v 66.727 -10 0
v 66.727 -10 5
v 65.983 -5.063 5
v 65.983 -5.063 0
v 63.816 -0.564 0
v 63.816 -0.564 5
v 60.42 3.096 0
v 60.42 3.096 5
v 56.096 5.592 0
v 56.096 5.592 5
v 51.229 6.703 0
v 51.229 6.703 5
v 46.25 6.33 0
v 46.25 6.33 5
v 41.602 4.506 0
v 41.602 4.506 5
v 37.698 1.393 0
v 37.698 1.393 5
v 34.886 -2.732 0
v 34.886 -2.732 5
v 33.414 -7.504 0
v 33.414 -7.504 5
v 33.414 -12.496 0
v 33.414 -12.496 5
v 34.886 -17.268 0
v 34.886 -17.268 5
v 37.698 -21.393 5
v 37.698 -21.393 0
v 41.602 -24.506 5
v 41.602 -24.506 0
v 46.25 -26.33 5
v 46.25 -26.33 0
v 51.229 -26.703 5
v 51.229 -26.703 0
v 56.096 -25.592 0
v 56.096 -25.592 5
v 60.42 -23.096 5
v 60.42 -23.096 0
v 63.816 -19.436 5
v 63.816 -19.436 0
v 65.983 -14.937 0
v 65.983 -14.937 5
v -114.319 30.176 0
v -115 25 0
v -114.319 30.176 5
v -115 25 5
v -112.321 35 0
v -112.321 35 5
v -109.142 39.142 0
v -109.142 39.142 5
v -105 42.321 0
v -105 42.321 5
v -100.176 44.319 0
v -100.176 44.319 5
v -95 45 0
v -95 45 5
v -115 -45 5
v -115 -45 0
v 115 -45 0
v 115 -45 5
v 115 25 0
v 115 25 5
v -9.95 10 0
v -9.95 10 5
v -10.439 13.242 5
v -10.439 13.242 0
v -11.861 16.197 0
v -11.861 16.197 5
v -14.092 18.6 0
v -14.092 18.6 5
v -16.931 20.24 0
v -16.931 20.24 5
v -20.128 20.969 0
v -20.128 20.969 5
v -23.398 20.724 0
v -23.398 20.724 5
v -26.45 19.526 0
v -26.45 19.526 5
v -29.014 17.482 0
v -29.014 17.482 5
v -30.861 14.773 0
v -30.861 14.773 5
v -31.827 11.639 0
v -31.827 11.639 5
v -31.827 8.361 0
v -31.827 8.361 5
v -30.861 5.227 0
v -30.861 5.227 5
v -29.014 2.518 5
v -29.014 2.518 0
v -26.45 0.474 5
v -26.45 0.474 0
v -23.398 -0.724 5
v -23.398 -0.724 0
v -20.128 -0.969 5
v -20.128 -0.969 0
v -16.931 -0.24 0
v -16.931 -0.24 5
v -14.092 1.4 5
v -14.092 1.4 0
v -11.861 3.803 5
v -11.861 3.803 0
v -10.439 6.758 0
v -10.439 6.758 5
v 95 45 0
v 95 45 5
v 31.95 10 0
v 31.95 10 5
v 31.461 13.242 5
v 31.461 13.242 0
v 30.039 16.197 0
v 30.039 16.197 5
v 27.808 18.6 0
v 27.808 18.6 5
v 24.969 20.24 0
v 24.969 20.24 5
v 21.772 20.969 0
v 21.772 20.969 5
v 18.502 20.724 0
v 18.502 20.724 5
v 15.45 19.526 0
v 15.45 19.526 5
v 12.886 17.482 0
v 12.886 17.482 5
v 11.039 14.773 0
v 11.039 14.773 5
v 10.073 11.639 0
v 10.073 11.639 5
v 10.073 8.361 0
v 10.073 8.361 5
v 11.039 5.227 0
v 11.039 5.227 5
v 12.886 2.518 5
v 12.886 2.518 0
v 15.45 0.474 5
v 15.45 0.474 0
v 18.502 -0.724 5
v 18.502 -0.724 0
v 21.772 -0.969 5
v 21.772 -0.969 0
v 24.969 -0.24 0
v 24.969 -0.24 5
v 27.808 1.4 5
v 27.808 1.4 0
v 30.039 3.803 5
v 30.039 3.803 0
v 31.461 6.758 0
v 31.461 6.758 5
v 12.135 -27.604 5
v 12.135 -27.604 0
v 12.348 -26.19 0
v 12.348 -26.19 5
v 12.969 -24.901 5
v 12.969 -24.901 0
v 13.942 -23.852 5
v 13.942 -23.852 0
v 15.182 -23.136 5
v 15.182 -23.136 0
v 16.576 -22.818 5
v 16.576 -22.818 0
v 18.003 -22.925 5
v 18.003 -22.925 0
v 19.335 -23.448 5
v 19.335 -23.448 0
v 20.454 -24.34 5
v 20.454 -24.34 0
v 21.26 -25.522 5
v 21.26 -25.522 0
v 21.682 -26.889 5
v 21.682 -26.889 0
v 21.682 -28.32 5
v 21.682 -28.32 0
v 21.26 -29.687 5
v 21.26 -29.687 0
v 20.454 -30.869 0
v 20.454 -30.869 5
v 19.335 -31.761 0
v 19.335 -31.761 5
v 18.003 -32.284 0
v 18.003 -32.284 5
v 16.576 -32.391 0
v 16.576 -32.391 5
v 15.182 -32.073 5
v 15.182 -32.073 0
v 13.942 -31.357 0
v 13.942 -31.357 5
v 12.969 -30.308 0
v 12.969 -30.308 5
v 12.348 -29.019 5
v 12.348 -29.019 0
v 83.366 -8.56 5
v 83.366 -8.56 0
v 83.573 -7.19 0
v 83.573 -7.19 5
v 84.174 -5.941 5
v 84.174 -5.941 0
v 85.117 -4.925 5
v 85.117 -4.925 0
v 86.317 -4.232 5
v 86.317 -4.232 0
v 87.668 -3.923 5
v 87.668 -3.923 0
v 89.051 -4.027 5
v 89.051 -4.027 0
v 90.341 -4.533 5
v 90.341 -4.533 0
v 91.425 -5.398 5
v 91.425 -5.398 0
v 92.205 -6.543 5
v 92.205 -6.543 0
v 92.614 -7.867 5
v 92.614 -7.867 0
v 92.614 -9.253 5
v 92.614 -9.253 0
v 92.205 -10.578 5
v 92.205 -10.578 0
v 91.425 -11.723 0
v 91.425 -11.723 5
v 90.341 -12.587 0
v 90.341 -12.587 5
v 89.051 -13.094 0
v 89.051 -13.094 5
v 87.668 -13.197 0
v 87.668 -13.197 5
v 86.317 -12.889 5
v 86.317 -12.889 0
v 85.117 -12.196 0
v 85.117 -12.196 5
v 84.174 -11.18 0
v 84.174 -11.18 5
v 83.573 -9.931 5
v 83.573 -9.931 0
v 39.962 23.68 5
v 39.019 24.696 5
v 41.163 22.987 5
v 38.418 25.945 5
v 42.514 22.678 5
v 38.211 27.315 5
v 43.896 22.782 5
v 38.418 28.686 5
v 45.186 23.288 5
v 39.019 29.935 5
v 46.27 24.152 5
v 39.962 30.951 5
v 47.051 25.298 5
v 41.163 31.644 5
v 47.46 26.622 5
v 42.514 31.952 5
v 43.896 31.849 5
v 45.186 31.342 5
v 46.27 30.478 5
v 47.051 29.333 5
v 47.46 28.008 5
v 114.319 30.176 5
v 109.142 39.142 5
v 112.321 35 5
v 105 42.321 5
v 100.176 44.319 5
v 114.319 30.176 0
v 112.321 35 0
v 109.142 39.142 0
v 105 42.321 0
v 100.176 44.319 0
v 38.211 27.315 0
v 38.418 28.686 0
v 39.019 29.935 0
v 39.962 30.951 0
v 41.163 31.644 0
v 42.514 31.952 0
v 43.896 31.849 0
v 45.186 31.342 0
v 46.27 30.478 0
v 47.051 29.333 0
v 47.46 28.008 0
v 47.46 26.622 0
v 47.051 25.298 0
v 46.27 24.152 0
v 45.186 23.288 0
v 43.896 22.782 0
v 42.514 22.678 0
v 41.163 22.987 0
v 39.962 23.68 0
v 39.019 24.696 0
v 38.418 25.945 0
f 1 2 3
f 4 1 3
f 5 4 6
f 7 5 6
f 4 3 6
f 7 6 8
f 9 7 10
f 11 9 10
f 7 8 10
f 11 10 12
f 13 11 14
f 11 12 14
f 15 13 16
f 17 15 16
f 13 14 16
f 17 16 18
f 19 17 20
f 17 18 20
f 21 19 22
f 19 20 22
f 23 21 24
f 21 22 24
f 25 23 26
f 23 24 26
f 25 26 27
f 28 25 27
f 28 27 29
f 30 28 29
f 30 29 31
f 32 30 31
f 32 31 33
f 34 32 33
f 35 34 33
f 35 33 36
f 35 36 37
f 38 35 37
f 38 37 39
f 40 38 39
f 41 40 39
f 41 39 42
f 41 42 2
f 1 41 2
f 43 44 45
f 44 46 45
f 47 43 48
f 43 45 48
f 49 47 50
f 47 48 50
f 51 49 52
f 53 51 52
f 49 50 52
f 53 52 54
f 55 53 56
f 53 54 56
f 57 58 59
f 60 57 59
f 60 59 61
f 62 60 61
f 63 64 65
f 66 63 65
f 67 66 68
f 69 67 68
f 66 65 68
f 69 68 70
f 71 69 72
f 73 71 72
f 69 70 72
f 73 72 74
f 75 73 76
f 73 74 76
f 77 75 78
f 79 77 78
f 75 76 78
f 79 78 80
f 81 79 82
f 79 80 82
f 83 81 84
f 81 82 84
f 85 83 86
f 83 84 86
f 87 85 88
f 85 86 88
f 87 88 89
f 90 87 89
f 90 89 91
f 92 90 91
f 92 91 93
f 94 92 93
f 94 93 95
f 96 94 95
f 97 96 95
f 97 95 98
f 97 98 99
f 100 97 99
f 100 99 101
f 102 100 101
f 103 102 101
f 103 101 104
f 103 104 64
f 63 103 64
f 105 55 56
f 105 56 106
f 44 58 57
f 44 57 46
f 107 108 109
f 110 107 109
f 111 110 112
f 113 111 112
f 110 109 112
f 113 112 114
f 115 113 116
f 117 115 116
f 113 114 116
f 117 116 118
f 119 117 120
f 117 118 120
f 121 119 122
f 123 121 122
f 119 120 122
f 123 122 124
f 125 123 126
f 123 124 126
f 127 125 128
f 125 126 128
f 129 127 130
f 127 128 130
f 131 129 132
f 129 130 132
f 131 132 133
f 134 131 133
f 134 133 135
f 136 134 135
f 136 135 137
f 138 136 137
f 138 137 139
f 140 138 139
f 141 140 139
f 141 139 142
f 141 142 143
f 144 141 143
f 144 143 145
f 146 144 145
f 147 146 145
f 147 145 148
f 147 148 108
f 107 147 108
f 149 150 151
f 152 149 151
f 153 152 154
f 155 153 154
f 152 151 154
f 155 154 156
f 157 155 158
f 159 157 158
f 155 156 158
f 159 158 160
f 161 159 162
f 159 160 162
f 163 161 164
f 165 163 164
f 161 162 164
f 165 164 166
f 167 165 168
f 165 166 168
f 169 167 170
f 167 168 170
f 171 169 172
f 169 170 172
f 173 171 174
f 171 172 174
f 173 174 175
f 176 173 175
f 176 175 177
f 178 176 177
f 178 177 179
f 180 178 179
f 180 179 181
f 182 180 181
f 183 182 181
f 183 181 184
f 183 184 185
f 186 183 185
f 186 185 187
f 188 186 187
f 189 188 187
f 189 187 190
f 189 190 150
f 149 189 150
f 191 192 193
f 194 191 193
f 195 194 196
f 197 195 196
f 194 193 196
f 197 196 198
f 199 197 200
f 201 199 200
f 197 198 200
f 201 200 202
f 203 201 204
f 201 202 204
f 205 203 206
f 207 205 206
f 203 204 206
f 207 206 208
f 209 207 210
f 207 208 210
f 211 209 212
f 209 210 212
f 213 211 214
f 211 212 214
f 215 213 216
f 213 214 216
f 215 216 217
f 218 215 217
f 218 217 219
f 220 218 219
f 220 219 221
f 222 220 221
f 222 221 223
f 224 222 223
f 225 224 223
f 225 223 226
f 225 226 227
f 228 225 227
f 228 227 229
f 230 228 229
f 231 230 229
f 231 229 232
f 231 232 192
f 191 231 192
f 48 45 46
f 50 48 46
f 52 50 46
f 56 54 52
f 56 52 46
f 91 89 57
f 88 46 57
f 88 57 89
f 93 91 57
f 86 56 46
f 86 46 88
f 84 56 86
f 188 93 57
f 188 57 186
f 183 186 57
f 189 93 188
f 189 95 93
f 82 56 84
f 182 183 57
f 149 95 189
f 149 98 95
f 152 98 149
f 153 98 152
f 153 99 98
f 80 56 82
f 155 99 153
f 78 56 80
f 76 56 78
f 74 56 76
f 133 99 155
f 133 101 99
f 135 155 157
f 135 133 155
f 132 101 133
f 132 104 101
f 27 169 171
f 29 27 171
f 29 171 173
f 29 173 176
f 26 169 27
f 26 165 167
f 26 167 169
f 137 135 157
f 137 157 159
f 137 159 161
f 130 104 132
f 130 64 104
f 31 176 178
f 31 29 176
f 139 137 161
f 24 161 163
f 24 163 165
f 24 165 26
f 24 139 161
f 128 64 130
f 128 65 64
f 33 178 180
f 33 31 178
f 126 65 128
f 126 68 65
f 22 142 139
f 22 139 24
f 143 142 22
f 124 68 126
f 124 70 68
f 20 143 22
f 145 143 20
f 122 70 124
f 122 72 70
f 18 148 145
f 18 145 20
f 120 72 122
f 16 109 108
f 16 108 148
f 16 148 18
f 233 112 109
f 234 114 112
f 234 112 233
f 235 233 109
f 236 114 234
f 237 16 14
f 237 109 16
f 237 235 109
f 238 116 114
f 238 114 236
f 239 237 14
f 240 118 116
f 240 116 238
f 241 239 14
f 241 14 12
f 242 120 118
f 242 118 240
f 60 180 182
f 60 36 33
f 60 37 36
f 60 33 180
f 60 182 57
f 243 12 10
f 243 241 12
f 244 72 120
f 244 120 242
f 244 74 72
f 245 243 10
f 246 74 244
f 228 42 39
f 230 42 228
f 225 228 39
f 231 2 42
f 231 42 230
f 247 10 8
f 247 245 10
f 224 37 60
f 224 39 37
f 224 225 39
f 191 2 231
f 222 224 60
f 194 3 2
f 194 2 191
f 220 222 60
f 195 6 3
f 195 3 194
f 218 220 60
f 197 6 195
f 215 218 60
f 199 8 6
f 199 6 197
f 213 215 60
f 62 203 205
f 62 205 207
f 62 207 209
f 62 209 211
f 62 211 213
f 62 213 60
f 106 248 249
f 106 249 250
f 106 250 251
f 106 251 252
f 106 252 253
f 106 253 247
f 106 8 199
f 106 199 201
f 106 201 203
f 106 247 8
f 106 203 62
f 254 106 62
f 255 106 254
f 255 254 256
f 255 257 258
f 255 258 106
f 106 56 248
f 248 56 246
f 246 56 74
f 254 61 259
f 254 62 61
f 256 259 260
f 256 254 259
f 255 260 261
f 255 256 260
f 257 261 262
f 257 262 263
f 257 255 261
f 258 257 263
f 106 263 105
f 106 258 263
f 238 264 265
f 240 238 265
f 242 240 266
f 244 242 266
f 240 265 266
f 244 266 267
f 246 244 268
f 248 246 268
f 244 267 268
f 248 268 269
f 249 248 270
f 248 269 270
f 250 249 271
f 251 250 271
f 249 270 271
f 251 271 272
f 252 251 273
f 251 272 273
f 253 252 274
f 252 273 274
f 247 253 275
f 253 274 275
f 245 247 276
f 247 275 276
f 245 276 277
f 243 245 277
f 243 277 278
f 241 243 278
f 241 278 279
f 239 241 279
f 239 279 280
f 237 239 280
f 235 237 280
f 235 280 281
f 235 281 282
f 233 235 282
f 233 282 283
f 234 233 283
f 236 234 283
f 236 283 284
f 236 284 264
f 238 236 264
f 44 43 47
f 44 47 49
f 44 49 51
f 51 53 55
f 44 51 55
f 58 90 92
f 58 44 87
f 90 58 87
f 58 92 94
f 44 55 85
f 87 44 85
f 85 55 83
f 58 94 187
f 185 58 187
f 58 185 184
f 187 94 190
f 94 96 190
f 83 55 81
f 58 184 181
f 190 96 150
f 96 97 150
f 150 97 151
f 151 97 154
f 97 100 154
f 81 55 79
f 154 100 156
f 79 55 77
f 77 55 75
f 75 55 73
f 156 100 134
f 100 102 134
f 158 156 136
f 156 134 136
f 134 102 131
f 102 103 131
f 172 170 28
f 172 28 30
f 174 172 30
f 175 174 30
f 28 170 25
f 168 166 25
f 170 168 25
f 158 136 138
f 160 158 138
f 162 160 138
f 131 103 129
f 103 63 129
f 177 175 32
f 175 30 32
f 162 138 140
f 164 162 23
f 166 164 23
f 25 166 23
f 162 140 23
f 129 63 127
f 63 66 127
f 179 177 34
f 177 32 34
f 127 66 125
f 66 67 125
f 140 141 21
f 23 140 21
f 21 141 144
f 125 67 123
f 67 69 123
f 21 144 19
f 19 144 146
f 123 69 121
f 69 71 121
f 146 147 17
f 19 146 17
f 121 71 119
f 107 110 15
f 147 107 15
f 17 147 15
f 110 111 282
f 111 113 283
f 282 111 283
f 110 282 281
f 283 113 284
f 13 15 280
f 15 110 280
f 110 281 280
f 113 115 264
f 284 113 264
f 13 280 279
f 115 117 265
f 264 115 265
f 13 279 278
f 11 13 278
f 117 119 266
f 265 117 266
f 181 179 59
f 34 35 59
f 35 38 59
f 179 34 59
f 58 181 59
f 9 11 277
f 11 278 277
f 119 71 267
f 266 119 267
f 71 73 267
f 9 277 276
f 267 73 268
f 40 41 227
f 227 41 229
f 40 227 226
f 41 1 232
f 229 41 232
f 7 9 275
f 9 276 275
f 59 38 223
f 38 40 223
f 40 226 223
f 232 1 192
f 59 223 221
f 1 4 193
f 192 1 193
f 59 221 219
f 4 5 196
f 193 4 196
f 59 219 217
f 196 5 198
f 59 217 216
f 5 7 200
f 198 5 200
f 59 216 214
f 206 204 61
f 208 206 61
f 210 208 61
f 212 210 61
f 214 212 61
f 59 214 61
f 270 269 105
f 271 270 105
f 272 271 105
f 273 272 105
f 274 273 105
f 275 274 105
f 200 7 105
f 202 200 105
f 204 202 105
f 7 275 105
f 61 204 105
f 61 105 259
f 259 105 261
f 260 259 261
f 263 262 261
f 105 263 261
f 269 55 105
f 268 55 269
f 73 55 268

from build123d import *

# Parameters (mm, degrees)
SKETCH1_W           = 230
SKETCH1_H           = 90
BOSS_EXTRUDE1_DEPTH = 5
FILLET1_R           = 20
CUT_EXTRUDE1_REACH  = 125.592
SKETCH2_R           = 11
SKETCH2_R_2         = 16.75
CUT_EXTRUDE2_REACH  = 125.592
SKETCH3_R           = 4.65
SKETCH3_R_2         = 4.8


with BuildPart() as part:
    # Sketch1 → Boss-Extrude1 (new body)
    with BuildSketch(Plane.XY):
        Rectangle(SKETCH1_W, SKETCH1_H)
    extrude(amount=BOSS_EXTRUDE1_DEPTH)

    # Fillet1
    fillet1_edges = [part.edges().sort_by_distance(p)[0] for p in [
        (-115, 45, 2.5),
        (115, 45, 2.5),
    ]]
    fillet(fillet1_edges, radius=FILLET1_R)

    # Sketch2 → Cut-Extrude1 (cut, up to next)
    with BuildSketch(Plane.XY.offset(5), mode=Mode.PRIVATE) as cut_extrude1_sk1:
        with Locations((-20.95, 10)):
            Circle(SKETCH2_R)
    cut_extrude1_tool1 = extrude(cut_extrude1_sk1.sketch, amount=-CUT_EXTRUDE1_REACH, mode=Mode.PRIVATE) & part.part
    # Sketch2 → Cut-Extrude1 (cut, up to next)
    with BuildSketch(Plane.XY.offset(5), mode=Mode.PRIVATE) as cut_extrude1_sk2:
        with Locations((20.95, 10)):
            Circle(SKETCH2_R)
    cut_extrude1_tool2 = extrude(cut_extrude1_sk2.sketch, amount=-CUT_EXTRUDE1_REACH, mode=Mode.PRIVATE) & part.part
    # Sketch2 → Cut-Extrude1 (cut, up to next)
    with BuildSketch(Plane.XY.offset(5), mode=Mode.PRIVATE) as cut_extrude1_sk3:
        with Locations((49.976927154, -10)):
            Circle(SKETCH2_R_2)
    cut_extrude1_tool3 = extrude(cut_extrude1_sk3.sketch, amount=-CUT_EXTRUDE1_REACH, mode=Mode.PRIVATE) & part.part
    add(cut_extrude1_tool1.solids().sort_by_distance((-20.95, 10, 5))[0], mode=Mode.SUBTRACT)
    add(cut_extrude1_tool2.solids().sort_by_distance((20.95, 10, 5))[0], mode=Mode.SUBTRACT)
    add(cut_extrude1_tool3.solids().sort_by_distance((49.976927, -10, 5))[0], mode=Mode.SUBTRACT)

    # Sketch3 → Cut-Extrude2 (cut, up to next)
    with BuildSketch(Plane(origin=(0, 0, 0), x_dir=(-1, 0, 0), z_dir=(0, 0, -1)), mode=Mode.PRIVATE) as cut_extrude2_sk1:
        with Locations((-42.861480484, 27.315297382)):
            Circle(SKETCH3_R)
    cut_extrude2_tool1 = extrude(cut_extrude2_sk1.sketch, amount=-CUT_EXTRUDE2_REACH, mode=Mode.PRIVATE) & part.part
    # Sketch3 → Cut-Extrude2 (cut, up to next)
    with BuildSketch(Plane(origin=(0, 0, 0), x_dir=(-1, 0, 0), z_dir=(0, 0, -1)), mode=Mode.PRIVATE) as cut_extrude2_sk2:
        with Locations((-88.015918911, -8.560303387)):
            Circle(SKETCH3_R)
    cut_extrude2_tool2 = extrude(cut_extrude2_sk2.sketch, amount=-CUT_EXTRUDE2_REACH, mode=Mode.PRIVATE) & part.part
    # Sketch3 → Cut-Extrude2 (cut, up to next)
    with BuildSketch(Plane(origin=(0, 0, 0), x_dir=(-1, 0, 0), z_dir=(0, 0, -1)), mode=Mode.PRIVATE) as cut_extrude2_sk3:
        with Locations((-16.935196723, -27.604446885)):
            Circle(SKETCH3_R_2)
    cut_extrude2_tool3 = extrude(cut_extrude2_sk3.sketch, amount=-CUT_EXTRUDE2_REACH, mode=Mode.PRIVATE) & part.part
    add(cut_extrude2_tool1.solids().sort_by_distance((42.86148, 27.315297, 0))[0], mode=Mode.SUBTRACT)
    add(cut_extrude2_tool2.solids().sort_by_distance((88.015919, -8.560303, 0))[0], mode=Mode.SUBTRACT)
    add(cut_extrude2_tool3.solids().sort_by_distance((16.935197, -27.604447, 0))[0], mode=Mode.SUBTRACT)


solid = part.part
